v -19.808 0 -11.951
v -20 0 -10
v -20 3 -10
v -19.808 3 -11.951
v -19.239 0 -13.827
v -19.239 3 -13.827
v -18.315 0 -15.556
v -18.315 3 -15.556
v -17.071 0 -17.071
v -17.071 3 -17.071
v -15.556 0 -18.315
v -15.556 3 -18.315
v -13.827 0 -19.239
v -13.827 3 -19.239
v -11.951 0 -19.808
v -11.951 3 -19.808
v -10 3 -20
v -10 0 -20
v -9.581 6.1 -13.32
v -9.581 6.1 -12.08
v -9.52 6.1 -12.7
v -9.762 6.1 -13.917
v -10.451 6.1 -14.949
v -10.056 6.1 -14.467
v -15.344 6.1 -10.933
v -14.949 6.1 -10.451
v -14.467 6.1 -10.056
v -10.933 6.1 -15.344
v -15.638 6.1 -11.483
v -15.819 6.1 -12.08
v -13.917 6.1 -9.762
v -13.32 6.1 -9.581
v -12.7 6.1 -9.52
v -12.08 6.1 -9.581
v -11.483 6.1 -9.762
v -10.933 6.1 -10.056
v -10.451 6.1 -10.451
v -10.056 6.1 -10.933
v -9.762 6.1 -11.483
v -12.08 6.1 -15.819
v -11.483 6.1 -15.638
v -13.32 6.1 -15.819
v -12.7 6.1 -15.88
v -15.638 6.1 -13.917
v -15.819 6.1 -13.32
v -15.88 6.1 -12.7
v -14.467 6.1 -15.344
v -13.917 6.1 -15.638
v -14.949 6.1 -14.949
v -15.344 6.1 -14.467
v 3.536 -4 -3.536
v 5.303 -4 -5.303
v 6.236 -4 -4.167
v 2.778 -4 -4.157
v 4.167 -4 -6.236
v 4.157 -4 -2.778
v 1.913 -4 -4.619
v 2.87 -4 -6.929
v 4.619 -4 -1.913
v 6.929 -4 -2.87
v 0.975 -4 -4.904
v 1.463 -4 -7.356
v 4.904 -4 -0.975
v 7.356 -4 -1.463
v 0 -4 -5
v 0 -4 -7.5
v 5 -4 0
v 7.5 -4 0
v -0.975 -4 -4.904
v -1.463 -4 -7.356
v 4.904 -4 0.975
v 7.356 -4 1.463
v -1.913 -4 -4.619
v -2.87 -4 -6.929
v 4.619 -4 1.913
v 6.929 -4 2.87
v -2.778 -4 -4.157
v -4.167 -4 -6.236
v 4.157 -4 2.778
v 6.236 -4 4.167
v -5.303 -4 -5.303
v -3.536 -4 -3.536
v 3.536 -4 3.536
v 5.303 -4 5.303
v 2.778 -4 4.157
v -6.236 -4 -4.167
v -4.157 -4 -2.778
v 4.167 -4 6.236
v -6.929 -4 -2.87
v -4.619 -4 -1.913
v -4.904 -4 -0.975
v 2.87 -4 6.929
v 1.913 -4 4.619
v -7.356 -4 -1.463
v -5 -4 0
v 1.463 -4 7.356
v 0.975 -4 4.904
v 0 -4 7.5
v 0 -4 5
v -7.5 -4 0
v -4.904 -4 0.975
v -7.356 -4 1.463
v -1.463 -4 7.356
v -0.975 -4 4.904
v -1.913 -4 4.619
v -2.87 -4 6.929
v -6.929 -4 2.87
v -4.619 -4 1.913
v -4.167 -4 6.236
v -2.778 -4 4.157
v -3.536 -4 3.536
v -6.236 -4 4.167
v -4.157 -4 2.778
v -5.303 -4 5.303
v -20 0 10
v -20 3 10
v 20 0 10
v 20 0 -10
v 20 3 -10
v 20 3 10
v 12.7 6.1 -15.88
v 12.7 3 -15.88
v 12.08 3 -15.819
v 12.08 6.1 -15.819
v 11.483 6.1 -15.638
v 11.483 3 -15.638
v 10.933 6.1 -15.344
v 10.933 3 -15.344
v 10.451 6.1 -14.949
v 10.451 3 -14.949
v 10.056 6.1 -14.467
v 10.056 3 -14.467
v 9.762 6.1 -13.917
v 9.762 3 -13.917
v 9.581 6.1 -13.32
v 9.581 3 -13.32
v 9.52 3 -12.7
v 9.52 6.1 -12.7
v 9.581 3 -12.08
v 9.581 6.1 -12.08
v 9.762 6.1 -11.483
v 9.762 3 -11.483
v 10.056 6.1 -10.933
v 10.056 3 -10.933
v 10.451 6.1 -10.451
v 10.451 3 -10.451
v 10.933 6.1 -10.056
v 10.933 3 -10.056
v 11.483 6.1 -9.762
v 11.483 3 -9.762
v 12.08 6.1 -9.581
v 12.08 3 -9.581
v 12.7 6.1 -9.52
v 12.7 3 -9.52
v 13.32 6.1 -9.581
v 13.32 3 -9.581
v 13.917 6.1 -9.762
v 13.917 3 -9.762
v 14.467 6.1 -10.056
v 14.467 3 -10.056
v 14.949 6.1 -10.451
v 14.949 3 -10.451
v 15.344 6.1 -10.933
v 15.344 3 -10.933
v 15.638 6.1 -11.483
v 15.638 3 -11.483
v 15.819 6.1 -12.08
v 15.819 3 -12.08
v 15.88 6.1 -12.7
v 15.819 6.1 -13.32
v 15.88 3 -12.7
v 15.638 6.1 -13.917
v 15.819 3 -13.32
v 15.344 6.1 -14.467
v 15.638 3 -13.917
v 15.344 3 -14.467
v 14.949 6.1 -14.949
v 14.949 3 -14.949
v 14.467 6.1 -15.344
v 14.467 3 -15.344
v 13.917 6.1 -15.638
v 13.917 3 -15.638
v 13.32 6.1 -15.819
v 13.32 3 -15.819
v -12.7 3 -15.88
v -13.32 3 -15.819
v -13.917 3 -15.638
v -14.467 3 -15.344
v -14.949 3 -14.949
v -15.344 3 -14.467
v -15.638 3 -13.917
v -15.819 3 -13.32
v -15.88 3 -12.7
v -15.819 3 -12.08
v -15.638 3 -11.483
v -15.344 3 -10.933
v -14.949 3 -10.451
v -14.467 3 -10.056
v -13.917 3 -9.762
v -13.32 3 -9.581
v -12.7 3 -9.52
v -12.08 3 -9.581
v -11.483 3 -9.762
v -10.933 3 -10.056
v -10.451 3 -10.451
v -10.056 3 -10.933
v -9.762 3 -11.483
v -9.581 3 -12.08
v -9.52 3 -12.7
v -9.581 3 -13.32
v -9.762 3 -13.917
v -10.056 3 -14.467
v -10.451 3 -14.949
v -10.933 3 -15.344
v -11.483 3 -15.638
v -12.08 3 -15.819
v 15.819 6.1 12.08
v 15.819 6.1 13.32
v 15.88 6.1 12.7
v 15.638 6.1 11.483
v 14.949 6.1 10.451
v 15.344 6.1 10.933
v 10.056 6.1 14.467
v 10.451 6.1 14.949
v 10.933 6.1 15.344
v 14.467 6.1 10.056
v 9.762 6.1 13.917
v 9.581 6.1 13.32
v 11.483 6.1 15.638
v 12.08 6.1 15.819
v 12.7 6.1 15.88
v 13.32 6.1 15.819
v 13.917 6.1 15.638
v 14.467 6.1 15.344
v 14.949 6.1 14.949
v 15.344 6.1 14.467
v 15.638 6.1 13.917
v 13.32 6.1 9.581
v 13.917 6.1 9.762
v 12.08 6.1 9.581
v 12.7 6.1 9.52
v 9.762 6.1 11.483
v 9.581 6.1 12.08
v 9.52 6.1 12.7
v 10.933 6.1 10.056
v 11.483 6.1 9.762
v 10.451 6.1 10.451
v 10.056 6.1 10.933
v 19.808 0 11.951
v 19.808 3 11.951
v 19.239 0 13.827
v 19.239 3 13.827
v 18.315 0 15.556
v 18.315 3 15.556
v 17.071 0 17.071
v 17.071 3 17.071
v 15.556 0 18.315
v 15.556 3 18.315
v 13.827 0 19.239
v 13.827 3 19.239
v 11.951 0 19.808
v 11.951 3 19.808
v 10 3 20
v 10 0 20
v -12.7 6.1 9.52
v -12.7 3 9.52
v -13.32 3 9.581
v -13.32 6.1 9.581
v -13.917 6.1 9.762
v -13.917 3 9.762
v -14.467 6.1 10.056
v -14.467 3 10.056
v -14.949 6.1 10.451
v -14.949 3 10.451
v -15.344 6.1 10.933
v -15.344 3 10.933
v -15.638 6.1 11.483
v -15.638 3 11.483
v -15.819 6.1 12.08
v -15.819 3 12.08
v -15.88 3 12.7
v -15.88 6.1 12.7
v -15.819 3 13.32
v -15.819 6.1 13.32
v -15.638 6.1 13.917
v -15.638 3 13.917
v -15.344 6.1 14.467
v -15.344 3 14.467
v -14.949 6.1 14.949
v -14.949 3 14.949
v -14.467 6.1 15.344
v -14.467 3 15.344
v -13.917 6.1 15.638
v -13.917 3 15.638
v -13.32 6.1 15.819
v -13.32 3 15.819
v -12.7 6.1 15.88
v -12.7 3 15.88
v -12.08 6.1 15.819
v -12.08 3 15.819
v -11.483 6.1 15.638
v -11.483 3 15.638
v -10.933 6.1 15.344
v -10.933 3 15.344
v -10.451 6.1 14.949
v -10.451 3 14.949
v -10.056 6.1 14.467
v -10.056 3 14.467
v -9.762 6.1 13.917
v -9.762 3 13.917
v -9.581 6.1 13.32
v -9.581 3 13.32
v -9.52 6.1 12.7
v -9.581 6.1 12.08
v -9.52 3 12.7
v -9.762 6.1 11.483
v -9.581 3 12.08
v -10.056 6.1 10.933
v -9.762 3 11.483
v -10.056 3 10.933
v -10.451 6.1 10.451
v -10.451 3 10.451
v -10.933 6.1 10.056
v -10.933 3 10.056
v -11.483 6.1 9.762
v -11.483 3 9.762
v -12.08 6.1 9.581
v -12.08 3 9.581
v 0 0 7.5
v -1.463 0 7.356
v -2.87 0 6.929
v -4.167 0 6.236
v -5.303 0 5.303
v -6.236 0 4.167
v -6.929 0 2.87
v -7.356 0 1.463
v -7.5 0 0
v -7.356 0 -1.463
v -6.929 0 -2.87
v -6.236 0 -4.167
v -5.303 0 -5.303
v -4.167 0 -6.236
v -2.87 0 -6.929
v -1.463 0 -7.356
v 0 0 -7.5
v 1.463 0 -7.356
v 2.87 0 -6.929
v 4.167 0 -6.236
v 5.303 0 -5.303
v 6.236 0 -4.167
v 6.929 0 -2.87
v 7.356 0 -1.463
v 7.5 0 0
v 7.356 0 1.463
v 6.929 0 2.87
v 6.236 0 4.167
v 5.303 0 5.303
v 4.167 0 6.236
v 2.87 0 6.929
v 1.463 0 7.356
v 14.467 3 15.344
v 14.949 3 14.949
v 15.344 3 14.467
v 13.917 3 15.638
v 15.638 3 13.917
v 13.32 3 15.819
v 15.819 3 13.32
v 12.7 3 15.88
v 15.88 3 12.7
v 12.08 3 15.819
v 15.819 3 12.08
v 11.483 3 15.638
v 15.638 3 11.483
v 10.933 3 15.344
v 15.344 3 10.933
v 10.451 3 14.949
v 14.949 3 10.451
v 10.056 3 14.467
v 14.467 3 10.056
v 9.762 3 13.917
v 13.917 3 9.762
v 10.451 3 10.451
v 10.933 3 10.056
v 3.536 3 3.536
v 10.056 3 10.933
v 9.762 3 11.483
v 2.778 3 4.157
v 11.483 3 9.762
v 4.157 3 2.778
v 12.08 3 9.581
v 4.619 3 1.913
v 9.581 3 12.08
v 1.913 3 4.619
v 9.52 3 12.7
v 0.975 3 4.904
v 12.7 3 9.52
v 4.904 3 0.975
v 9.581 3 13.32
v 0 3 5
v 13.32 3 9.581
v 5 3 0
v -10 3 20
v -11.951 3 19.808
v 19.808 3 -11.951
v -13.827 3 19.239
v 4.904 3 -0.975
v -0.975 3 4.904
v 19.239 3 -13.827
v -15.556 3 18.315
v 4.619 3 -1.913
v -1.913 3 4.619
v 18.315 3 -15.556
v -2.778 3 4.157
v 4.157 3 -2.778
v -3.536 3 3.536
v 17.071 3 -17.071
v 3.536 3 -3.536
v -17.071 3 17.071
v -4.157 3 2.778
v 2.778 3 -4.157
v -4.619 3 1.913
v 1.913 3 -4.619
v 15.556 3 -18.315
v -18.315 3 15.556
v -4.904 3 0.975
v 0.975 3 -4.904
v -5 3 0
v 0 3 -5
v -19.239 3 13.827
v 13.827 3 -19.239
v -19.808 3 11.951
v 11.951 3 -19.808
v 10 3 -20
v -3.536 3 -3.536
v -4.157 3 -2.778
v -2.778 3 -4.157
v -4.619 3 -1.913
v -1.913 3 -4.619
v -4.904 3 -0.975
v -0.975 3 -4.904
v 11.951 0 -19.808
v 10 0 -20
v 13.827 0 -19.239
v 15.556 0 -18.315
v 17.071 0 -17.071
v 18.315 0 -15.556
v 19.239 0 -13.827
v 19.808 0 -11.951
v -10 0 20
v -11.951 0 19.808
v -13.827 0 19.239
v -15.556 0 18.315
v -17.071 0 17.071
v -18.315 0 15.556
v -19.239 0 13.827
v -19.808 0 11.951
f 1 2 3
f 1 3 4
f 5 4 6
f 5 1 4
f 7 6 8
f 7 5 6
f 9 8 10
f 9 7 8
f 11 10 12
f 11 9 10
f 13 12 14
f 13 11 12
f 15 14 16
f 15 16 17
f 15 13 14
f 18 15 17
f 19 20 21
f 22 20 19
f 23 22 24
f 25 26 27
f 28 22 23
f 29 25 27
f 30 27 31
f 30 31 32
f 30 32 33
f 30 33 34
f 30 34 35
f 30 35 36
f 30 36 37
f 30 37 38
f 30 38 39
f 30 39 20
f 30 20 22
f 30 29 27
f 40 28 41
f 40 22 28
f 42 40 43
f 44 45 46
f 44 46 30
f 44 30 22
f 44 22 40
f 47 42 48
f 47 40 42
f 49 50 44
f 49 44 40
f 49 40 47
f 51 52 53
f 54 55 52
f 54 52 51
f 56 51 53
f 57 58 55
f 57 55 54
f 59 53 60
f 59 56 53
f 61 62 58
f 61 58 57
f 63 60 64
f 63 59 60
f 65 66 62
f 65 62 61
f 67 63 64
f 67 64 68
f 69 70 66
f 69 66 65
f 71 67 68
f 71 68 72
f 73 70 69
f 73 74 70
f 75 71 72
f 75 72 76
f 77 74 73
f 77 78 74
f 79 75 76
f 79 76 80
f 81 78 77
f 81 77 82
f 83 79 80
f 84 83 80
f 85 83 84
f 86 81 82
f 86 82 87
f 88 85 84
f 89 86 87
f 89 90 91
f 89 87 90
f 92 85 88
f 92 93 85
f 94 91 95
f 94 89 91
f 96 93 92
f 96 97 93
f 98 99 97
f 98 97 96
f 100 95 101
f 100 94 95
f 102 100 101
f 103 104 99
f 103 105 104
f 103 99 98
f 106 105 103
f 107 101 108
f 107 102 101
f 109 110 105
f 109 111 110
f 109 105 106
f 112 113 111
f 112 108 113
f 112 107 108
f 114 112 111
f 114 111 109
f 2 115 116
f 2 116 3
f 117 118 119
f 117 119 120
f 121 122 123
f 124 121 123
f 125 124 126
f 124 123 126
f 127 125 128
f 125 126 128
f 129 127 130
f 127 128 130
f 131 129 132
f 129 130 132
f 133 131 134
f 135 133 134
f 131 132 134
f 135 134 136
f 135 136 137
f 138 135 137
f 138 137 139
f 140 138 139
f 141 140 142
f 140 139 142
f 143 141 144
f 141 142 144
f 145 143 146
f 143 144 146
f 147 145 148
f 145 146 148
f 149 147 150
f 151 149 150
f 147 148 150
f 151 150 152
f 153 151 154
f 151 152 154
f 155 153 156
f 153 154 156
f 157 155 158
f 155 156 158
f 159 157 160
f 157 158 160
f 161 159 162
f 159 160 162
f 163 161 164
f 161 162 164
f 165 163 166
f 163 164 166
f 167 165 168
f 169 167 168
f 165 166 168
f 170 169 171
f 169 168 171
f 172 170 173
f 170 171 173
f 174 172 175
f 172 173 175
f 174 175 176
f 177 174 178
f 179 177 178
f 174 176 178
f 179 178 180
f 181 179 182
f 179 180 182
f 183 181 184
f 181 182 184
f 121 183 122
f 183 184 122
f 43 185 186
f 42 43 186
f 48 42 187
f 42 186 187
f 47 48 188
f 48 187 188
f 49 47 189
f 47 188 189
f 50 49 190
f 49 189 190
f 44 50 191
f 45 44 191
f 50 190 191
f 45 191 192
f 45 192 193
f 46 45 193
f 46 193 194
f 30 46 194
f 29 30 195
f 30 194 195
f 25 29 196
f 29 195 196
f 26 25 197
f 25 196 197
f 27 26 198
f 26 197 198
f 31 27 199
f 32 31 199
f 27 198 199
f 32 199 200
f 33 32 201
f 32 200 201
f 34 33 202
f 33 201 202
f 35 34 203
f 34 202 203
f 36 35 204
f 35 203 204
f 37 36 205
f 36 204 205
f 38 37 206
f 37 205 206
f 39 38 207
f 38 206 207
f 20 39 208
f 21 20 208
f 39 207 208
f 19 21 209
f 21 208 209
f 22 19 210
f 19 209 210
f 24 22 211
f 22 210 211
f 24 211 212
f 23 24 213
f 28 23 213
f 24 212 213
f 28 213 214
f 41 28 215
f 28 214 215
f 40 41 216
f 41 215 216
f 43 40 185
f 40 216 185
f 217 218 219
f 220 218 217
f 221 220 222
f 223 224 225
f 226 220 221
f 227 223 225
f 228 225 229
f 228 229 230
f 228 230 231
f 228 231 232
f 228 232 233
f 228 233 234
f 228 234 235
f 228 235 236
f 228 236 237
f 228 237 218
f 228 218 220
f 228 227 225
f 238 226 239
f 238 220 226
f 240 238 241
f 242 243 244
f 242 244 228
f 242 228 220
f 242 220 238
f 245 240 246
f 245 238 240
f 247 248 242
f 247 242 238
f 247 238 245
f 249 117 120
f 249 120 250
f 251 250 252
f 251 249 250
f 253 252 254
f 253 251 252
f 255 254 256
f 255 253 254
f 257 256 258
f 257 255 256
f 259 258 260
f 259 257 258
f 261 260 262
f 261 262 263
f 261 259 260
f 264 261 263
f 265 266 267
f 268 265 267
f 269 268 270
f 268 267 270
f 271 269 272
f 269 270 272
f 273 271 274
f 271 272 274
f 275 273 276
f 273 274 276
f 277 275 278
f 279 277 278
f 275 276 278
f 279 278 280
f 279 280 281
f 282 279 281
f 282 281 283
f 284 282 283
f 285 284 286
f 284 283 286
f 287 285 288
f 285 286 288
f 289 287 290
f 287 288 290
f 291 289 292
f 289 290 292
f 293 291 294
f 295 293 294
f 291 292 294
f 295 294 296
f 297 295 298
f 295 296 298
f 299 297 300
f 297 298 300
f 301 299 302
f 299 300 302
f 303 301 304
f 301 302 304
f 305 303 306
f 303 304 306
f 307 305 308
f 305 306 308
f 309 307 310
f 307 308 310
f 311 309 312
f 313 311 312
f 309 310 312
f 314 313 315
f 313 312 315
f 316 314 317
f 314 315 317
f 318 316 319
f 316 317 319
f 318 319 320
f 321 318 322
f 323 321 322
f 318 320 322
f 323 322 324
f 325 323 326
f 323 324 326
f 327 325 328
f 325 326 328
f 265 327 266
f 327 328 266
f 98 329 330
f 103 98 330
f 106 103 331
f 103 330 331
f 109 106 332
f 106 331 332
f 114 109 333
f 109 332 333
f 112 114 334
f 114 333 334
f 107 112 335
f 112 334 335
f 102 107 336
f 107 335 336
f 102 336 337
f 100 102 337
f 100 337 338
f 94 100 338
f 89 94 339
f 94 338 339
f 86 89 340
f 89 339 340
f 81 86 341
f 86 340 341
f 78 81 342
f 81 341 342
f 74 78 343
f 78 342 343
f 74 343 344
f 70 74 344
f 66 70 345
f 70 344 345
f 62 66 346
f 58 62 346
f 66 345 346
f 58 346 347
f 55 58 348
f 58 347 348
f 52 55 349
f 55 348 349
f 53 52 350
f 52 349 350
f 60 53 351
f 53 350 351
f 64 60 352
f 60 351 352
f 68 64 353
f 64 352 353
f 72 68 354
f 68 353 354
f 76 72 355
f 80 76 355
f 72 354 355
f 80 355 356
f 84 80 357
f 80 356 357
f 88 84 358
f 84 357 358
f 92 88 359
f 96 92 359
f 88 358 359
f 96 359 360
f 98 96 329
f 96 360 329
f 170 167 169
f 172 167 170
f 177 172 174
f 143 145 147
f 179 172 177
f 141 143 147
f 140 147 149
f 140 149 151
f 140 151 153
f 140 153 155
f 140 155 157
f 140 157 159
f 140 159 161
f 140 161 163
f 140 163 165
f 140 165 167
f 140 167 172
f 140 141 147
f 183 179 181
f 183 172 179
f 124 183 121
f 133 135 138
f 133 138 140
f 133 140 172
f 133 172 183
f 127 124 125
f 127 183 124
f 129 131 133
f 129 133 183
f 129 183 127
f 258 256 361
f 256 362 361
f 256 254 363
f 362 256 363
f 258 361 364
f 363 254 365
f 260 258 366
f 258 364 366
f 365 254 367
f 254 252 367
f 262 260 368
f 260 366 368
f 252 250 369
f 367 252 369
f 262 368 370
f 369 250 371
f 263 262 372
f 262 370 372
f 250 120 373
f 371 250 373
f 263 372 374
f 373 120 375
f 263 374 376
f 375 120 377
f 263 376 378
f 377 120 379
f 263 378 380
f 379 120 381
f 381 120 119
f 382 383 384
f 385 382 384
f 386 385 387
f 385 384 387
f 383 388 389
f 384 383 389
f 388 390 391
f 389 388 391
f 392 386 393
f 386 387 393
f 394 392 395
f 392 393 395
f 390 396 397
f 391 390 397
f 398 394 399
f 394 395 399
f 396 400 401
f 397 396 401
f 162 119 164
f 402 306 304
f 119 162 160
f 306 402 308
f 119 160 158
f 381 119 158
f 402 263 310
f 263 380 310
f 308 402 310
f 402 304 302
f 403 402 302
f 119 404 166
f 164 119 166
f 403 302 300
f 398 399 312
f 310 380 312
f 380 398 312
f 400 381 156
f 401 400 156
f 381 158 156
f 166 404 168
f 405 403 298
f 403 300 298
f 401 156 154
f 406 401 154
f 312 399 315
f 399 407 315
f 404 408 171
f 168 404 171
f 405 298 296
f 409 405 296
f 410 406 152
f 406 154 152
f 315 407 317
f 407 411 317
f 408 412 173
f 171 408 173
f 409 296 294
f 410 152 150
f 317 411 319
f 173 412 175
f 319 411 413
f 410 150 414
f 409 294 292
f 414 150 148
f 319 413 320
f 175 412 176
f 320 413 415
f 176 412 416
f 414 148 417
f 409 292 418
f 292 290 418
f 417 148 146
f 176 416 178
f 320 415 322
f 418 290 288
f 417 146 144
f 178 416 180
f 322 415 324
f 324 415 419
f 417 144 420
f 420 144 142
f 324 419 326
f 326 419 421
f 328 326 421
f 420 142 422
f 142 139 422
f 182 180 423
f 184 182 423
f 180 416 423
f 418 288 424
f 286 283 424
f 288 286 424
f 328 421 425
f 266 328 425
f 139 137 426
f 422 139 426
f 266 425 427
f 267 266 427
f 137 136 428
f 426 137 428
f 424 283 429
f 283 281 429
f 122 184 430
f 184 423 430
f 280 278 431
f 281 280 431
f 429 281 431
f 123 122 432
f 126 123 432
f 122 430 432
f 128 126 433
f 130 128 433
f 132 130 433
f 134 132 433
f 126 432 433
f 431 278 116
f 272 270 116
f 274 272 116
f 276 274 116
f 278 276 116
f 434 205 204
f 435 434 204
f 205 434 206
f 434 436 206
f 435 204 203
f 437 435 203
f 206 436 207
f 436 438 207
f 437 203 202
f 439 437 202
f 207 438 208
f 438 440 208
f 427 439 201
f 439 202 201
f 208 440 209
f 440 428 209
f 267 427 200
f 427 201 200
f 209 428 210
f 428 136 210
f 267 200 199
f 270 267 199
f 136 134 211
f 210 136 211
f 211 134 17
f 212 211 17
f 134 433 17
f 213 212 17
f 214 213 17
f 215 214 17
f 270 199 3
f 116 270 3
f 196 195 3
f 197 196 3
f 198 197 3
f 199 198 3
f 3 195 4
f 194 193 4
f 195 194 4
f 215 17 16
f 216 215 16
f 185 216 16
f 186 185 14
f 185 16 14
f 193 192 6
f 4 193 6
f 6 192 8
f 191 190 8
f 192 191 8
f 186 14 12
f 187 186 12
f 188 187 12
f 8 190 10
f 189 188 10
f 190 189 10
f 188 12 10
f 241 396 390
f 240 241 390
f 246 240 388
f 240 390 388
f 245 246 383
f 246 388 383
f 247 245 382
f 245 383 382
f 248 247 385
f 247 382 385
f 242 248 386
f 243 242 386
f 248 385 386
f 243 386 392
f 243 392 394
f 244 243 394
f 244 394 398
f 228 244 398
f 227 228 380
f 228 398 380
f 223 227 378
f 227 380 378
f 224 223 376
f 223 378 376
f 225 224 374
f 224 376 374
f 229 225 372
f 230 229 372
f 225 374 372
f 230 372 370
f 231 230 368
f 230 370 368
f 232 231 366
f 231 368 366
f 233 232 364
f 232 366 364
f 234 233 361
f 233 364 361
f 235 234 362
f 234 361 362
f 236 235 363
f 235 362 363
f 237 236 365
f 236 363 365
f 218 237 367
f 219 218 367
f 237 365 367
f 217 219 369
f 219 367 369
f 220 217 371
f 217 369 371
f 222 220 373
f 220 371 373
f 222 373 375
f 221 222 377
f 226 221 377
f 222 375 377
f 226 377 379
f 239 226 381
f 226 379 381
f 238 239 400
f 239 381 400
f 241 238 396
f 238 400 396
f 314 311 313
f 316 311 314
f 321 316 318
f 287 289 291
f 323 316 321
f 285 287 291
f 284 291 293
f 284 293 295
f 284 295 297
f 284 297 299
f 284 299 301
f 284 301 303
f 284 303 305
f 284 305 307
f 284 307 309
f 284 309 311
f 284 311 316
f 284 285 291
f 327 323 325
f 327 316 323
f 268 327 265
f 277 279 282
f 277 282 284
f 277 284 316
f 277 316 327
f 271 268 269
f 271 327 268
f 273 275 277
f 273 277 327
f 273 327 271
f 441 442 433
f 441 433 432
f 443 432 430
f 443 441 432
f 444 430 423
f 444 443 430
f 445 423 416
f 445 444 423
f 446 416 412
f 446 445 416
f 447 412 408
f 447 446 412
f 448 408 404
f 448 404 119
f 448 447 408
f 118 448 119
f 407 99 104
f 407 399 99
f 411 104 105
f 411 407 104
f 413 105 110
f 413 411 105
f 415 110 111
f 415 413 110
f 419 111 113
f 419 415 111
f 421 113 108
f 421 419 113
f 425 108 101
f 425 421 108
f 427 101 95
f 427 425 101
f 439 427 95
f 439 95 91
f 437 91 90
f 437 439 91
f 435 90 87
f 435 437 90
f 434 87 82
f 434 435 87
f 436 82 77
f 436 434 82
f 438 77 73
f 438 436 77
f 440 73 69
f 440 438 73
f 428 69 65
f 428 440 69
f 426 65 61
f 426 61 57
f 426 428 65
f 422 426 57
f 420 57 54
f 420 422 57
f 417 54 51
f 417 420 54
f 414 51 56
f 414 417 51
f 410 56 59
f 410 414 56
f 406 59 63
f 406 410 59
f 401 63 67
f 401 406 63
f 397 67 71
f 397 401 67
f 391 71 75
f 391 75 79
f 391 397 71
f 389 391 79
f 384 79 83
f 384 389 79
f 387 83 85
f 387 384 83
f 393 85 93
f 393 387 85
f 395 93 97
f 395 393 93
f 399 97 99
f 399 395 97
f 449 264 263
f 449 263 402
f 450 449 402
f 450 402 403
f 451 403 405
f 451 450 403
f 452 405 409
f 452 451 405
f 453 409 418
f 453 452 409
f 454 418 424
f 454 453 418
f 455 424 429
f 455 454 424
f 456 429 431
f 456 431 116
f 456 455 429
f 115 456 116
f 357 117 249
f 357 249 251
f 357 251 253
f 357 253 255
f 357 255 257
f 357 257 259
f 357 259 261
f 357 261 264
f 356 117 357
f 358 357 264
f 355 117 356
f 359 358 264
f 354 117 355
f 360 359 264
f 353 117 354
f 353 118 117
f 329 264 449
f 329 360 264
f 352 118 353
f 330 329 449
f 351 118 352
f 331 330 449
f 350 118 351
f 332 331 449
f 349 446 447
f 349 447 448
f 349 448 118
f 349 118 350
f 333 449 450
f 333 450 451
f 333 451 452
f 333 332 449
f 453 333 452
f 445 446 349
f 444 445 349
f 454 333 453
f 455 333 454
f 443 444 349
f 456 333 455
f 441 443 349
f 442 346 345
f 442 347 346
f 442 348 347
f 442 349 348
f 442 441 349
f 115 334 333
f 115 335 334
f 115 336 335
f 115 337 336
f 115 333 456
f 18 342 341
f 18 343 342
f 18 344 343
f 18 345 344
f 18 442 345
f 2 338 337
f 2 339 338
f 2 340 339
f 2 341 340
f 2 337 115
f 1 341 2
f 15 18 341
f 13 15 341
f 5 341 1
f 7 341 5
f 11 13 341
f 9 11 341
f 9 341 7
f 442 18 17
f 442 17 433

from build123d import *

# Parameters (mm, degrees)
EXTRUDE_1_DEPTH     = 3
SKETCH_2_R          = 3.18
EXTRUDE_2_DEPTH     = 3.1
SKETCH_3_R          = 5
CUT_EXTRUDE_1_DEPTH = 3.1
SKETCH_4_R          = 7.5
SKETCH_4_R_2        = 5
EXTRUDE_3_DEPTH     = 4


with BuildPart() as part:
    # 草图1 → 凸台-拉伸1 (new body)
    with BuildSketch(Plane(origin=(0, 0, 0), x_dir=(1, 0, 0), z_dir=(0, 1, 0))):
        with BuildLine():
            Line((-10, 20), (10, 20))
            ThreePointArc((10, 20), (17.071067812, 17.071067812), (20, 10))
            Line((20, 10), (20, -10))
            ThreePointArc((20, -10), (17.071067812, -17.071067812), (10, -20))
            Line((10, -20), (-10, -20))
            ThreePointArc((-10, -20), (-17.071067812, -17.071067812), (-20, -10))
            Line((-20, -10), (-20, 10))
            ThreePointArc((-20, 10), (-17.071067812, 17.071067812), (-10, 20))
        make_face()
    extrude(amount=EXTRUDE_1_DEPTH)

    # 草图2 → 凸台-拉伸2 (add)
    with BuildSketch(Plane(origin=(0, 3, 0), x_dir=(1, 0, 0), z_dir=(0, 1, 0))):
        with Locations(Location((12.7, 12.7, 0), (0, 0, 90))):
            Circle(SKETCH_2_R)
        with Locations(Location((12.7, -12.7, 0), (0, 0, 90))):
            Circle(SKETCH_2_R)
        with Locations(Location((-12.7, -12.7, 0), (0, 0, 90))):
            Circle(SKETCH_2_R)
        with Locations(Location((-12.7, 12.7, 0), (0, 0, 90))):
            Circle(SKETCH_2_R)
    extrude(amount=EXTRUDE_2_DEPTH)

    # 草图3 → 切除-拉伸1 (cut)
    with BuildSketch(Plane(origin=(0, 3, 0), x_dir=(1, 0, 0), z_dir=(0, 1, 0))):
        with Locations(Location((0, 0, 0), (0, 0, 270))):
            Circle(SKETCH_3_R)
    extrude(amount=-CUT_EXTRUDE_1_DEPTH, mode=Mode.SUBTRACT)

    # 草图4 → 凸台-拉伸3 (add)
    with BuildSketch(Plane.XZ):
        with Locations(Location((0, 0, 0), (0, 0, 90))):
            Circle(SKETCH_4_R)
        with Locations(Location((0, 0, 0), (0, 0, 90))):
            Circle(SKETCH_4_R_2, mode=Mode.SUBTRACT)
    extrude(amount=EXTRUDE_3_DEPTH)


solid = part.part
